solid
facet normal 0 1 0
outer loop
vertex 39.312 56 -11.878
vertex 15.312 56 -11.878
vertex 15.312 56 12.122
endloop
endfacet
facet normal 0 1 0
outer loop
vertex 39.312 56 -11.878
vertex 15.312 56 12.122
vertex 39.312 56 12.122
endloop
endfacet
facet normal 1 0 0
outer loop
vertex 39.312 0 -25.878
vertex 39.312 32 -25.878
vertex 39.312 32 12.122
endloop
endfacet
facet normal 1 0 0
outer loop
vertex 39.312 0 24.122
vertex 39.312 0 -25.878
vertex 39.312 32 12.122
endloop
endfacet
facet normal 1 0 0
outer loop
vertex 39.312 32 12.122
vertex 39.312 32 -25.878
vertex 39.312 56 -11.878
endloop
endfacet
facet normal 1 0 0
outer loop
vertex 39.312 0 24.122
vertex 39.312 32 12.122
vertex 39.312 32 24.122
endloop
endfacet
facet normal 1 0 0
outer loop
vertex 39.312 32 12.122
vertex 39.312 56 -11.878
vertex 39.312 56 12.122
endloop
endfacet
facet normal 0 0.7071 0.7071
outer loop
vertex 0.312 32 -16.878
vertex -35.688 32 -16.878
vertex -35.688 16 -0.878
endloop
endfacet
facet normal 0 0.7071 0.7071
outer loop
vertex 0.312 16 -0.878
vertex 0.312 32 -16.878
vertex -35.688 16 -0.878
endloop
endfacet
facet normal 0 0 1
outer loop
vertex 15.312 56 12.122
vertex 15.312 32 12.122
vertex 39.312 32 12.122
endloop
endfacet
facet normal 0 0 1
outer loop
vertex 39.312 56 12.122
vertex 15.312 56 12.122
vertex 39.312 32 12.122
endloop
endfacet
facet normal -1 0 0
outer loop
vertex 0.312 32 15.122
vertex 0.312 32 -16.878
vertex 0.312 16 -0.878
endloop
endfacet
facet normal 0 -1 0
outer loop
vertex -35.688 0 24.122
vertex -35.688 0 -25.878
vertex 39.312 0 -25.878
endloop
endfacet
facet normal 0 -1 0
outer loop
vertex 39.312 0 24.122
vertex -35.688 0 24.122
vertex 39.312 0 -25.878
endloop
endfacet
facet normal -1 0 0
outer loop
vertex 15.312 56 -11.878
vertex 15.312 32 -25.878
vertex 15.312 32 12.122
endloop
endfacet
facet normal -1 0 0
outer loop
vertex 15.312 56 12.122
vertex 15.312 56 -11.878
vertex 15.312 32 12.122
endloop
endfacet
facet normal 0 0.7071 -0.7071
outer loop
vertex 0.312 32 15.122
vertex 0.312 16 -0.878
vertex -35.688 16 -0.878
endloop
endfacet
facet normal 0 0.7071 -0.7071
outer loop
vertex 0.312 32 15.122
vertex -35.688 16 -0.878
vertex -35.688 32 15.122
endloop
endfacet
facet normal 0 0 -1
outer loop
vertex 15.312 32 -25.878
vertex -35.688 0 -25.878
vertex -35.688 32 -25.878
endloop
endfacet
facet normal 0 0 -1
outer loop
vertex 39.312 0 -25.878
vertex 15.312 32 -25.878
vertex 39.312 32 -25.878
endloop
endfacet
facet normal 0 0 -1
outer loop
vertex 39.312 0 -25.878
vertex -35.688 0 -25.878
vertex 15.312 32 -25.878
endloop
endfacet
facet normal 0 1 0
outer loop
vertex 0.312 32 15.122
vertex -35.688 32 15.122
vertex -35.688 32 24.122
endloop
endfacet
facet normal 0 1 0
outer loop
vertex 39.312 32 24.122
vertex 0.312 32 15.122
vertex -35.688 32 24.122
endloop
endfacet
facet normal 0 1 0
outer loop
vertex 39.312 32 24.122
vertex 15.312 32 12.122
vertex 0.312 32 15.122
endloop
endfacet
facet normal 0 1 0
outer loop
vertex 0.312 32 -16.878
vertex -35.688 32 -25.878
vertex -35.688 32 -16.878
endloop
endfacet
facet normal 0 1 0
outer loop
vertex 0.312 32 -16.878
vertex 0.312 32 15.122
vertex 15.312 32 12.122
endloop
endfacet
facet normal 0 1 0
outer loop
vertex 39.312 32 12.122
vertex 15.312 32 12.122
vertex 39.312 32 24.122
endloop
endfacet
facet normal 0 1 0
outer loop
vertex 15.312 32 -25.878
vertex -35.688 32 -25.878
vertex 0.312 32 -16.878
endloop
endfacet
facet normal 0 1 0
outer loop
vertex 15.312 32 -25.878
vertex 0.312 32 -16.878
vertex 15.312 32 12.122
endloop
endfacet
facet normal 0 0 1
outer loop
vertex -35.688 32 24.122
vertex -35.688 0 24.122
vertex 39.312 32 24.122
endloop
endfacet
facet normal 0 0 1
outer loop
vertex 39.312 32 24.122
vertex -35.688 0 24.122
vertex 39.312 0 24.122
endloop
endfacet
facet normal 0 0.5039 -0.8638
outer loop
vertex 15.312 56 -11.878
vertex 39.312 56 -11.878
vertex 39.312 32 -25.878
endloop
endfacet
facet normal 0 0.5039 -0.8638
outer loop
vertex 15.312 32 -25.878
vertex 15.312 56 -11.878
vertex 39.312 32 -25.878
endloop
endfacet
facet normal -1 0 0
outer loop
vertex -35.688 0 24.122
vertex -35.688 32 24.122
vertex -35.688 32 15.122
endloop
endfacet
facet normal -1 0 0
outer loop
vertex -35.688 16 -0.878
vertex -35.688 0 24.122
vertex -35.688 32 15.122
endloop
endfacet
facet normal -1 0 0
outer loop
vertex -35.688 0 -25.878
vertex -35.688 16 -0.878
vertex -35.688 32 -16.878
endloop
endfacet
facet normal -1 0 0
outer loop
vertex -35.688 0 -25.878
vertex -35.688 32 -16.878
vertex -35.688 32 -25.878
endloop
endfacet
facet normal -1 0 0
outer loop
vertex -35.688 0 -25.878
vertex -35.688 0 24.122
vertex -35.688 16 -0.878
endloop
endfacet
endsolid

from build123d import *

# Parameters (mm, degrees)
SKETCH2_W           = 75
SKETCH2_H           = 50
BOSS_EXTRUDE1_DEPTH = 32
CUT_EXTRUDE1_DEPTH  = 36
SKETCH5_W           = 24
SKETCH5_H           = 24
BOSS_EXTRUDE3_DEPTH = 24
BOSS_EXTRUDE4_DEPTH = 24


with BuildPart() as part:
    # Sketch2 → Boss-Extrude1 (new body)
    with BuildSketch(Plane(origin=(0, 0, 0), x_dir=(1, 0, 0), z_dir=(0, 1, 0))):
        with Locations((1.812039309, 0.877582126)):
            Rectangle(SKETCH2_W, SKETCH2_H)
    extrude(amount=BOSS_EXTRUDE1_DEPTH)

    # Sketch4 → Cut-Extrude1 (cut)
    with BuildSketch(Plane.ZY.offset(35.687960691)):
        Polygon((-16.877582126, 32), (-0.877582126, 16), (15.122417874, 32), align=None)
    extrude(amount=-CUT_EXTRUDE1_DEPTH, mode=Mode.SUBTRACT)

    # Sketch5 → Boss-Extrude3 (add)
    with BuildSketch(Plane(origin=(0, 32, 0), x_dir=(1, 0, 0), z_dir=(0, 1, 0))):
        with Locations((27.312039309, -0.122417874)):
            Rectangle(SKETCH5_W, SKETCH5_H)
    extrude(amount=BOSS_EXTRUDE3_DEPTH)

    # Sketch6 → Boss-Extrude4 (add)
    with BuildSketch(Plane(origin=(39.312039309, 0, 0), x_dir=(0, 0, -1), z_dir=(1, 0, 0))):
        Polygon((11.877582126, 56), (25.877582126, 32), (11.877582126, 32), align=None)
    extrude(amount=-BOSS_EXTRUDE4_DEPTH)


solid = part.part
